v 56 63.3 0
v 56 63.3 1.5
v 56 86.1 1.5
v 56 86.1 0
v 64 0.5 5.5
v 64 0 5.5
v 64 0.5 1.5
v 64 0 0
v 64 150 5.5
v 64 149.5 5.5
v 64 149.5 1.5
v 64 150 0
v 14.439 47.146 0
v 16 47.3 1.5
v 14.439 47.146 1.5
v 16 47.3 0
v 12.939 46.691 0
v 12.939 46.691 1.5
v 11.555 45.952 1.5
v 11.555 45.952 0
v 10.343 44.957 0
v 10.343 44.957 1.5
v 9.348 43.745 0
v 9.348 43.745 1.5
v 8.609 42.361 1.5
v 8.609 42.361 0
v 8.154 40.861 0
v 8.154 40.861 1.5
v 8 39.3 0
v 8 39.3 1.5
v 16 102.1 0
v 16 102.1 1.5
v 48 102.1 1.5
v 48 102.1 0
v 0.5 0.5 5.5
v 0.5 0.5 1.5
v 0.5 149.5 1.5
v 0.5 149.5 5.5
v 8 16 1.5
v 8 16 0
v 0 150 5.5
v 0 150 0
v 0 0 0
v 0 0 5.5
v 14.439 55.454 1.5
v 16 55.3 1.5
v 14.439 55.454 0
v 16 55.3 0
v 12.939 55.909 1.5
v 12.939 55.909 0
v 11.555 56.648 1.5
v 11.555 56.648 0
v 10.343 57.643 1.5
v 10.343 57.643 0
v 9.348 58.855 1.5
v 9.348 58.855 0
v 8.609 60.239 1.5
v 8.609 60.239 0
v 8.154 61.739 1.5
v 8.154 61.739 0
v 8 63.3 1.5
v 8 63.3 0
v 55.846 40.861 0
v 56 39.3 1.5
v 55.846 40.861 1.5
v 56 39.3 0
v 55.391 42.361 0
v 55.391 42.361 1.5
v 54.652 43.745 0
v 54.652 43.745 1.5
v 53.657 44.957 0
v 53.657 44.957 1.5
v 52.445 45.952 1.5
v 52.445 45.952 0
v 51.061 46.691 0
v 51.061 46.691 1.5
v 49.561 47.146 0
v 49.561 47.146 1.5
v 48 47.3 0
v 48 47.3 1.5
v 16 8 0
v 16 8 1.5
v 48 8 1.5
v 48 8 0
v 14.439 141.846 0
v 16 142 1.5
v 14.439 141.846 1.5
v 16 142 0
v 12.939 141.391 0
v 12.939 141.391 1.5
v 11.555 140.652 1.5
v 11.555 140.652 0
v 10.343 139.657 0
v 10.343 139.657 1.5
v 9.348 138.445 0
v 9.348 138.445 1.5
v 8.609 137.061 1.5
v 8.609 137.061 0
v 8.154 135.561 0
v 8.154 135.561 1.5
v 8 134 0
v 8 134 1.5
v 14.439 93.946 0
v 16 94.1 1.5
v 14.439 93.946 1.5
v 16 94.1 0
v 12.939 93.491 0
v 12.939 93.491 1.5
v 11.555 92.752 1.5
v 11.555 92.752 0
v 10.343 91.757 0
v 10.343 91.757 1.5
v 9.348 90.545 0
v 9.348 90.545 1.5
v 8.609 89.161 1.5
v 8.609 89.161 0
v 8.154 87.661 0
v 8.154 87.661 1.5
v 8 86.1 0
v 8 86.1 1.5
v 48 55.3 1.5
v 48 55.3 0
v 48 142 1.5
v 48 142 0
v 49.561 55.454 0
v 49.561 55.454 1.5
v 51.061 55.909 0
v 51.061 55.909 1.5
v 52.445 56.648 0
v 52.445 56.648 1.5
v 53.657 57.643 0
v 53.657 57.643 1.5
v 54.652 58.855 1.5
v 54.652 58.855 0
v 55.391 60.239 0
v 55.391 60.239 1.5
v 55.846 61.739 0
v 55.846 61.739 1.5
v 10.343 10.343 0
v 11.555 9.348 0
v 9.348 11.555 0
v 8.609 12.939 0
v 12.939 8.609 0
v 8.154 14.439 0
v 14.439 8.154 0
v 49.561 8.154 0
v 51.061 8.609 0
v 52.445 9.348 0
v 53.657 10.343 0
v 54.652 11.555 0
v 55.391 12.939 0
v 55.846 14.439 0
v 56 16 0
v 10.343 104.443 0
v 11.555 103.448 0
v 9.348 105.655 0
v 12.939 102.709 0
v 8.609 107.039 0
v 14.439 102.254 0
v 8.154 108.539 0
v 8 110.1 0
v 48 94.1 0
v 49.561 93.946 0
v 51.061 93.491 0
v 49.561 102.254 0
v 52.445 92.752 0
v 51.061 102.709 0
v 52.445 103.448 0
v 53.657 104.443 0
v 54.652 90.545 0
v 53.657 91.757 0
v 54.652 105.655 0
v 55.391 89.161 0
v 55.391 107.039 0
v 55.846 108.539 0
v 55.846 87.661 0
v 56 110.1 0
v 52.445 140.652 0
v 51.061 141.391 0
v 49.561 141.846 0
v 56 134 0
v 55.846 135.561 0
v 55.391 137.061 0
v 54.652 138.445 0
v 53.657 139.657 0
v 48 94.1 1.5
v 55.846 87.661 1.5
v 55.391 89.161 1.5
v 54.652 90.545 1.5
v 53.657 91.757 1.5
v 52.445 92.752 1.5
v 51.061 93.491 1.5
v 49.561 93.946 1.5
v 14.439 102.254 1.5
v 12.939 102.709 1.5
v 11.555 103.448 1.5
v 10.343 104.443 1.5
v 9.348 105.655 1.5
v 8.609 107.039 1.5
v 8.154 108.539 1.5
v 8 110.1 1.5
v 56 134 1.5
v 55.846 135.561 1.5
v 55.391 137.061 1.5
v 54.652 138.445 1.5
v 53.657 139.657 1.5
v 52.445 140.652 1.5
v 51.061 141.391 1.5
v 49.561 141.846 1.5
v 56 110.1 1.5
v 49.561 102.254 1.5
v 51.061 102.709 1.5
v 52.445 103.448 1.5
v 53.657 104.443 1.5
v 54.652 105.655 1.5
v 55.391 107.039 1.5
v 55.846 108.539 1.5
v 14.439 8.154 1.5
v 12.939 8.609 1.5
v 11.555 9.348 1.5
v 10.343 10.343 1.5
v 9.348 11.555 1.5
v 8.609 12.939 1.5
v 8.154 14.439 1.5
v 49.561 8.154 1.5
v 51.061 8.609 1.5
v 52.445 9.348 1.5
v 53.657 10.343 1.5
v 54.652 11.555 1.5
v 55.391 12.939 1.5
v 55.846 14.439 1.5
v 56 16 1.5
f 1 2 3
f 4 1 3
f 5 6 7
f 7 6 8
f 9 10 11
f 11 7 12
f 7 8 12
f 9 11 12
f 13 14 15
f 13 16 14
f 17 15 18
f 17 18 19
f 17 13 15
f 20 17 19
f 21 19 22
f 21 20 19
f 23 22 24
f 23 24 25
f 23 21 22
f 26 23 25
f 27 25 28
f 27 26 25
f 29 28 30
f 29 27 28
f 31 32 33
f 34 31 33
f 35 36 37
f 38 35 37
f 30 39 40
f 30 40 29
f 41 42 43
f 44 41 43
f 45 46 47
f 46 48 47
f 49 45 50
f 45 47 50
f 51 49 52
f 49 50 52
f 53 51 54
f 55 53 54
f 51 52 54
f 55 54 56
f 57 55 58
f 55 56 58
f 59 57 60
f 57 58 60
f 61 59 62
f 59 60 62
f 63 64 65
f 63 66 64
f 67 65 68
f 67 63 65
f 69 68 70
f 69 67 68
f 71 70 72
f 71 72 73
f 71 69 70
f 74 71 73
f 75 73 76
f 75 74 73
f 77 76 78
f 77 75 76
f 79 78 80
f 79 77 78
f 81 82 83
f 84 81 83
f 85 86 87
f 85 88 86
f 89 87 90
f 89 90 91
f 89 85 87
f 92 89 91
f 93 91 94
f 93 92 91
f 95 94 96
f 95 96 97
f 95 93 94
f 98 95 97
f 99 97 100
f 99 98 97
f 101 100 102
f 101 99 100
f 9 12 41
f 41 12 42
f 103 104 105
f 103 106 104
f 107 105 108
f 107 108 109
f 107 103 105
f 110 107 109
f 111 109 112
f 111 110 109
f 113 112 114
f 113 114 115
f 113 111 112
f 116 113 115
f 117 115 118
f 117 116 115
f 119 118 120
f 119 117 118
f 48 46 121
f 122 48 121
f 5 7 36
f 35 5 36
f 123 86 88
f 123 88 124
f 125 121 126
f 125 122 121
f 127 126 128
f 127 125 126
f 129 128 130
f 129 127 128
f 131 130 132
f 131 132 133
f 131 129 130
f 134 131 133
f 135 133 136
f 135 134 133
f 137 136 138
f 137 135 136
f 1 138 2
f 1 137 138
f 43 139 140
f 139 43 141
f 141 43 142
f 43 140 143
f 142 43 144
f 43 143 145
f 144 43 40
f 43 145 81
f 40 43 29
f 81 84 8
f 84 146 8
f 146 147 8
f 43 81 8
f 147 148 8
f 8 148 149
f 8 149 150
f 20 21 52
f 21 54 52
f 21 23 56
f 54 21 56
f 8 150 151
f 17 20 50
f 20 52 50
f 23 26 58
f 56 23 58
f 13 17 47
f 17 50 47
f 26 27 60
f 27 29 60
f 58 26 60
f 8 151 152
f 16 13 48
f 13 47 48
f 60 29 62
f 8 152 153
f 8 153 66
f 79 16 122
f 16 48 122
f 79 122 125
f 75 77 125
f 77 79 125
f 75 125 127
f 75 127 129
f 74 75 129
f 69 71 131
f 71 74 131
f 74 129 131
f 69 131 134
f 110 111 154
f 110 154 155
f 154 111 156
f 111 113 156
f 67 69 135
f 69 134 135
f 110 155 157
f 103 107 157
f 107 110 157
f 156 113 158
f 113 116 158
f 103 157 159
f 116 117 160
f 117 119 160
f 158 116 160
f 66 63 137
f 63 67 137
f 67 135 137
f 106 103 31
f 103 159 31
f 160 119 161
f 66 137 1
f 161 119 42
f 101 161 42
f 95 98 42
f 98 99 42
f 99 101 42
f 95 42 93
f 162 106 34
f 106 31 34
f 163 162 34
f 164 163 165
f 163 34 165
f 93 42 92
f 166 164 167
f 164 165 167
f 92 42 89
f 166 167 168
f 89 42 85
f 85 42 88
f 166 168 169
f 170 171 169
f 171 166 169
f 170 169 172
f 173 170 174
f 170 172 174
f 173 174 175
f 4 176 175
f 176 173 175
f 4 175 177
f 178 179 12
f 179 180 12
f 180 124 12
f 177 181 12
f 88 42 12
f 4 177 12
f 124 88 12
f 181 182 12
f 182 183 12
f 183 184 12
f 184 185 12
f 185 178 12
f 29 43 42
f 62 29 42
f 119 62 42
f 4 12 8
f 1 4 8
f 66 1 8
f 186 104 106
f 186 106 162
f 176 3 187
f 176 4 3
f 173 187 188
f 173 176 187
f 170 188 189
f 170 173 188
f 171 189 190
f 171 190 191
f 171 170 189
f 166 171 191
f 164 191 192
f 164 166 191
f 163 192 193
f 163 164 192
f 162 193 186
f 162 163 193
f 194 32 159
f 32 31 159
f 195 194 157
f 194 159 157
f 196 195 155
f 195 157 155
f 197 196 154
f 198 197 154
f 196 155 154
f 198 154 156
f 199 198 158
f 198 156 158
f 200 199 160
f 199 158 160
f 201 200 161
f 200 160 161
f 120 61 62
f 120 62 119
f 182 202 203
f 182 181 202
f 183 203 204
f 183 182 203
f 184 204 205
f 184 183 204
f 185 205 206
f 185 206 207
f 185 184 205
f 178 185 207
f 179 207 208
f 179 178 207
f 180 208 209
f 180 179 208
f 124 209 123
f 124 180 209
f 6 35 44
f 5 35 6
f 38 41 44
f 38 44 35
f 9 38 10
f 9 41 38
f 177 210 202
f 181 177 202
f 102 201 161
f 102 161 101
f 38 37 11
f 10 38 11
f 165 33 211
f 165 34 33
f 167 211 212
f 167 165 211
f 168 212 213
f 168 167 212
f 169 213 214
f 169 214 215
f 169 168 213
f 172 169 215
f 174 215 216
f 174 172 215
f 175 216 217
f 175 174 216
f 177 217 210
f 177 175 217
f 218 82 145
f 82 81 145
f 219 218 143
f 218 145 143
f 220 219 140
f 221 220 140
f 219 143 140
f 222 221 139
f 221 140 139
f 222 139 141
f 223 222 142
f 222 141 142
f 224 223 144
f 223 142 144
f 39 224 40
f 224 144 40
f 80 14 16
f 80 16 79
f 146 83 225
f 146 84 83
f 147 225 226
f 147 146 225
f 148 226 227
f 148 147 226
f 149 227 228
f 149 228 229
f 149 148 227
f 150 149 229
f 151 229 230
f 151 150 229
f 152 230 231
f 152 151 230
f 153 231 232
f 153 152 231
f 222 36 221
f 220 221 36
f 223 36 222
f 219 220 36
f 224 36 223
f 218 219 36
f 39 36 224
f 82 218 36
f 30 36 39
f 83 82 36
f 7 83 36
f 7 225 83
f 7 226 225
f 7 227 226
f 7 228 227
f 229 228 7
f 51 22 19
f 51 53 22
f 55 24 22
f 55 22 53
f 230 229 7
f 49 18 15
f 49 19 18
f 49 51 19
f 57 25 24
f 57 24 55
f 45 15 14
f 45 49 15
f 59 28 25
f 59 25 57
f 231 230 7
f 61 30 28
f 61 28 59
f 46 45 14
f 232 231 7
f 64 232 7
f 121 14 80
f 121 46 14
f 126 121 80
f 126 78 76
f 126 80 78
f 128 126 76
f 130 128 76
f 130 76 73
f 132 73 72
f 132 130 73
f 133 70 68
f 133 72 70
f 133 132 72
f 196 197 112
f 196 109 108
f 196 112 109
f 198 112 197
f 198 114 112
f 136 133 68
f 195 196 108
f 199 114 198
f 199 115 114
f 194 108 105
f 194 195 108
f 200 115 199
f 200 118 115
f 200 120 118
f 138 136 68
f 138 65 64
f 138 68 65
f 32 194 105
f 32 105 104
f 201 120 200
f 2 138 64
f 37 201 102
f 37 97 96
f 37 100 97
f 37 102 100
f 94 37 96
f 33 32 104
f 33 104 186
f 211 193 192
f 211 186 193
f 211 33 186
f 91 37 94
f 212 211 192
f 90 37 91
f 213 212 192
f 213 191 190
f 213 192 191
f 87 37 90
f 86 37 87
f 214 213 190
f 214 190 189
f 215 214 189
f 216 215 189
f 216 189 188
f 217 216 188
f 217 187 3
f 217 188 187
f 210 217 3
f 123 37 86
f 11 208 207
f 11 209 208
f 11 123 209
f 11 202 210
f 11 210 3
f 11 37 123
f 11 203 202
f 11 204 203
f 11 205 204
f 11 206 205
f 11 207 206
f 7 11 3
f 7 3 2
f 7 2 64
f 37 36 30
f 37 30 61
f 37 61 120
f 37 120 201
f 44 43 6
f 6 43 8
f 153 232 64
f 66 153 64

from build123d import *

# Parameters (mm, degrees)
F0_W     = 64
F0_H     = 150
F1_DEPTH = 1.5
F2_W     = 48
F2_H     = 39.9
F2_H_2   = 38.8
F2_H_3   = 39.3
F3_DEPTH = 1.501
F4_R     = 8
F6_DEPTH = 4


with BuildPart() as f1:
    # F0 (on Top) → F1 (new body)
    with BuildSketch(Plane.XY):
        with Locations((32, 75)):
            Rectangle(F0_W, F0_H)
    extrude(amount=F1_DEPTH)

    # F2 (on face) → F3 (cut, through all)
    with BuildSketch(Plane.XY.offset(1.5)):
        with Locations((32, 122.05)):
            Rectangle(F2_W, F2_H)
        with Locations((32, 74.7)):
            Rectangle(F2_W, F2_H_2)
        with Locations((32, 27.65)):
            Rectangle(F2_W, F2_H_3)
    extrude(amount=-F3_DEPTH, mode=Mode.SUBTRACT)

    # F4
    f4_edges = [f1.edges().sort_by_distance(p)[0] for p in [
        (8, 142, 0.75),
        (8, 94.1, 0.75),
        (8, 47.3, 0.75),
        (8, 102.1, 0.75),
        (8, 55.3, 0.75),
        (8, 8, 0.75),
        (56, 102.1, 0.75),
        (56, 55.3, 0.75),
        (56, 8, 0.75),
        (56, 142, 0.75),
        (56, 94.1, 0.75),
        (56, 47.3, 0.75),
    ]]
    fillet(f4_edges, radius=F4_R)

    # F5 (on face) → F6 (join)
    with BuildSketch(Plane.XY.offset(1.5)):
        Polygon((0, 0), (64, 0), (64, 0.5), (0.5, 0.5), (0.5, 149.5), (64, 149.5), (64, 150), (0, 150), align=None)
    extrude(amount=F6_DEPTH)


solid = f1.part
